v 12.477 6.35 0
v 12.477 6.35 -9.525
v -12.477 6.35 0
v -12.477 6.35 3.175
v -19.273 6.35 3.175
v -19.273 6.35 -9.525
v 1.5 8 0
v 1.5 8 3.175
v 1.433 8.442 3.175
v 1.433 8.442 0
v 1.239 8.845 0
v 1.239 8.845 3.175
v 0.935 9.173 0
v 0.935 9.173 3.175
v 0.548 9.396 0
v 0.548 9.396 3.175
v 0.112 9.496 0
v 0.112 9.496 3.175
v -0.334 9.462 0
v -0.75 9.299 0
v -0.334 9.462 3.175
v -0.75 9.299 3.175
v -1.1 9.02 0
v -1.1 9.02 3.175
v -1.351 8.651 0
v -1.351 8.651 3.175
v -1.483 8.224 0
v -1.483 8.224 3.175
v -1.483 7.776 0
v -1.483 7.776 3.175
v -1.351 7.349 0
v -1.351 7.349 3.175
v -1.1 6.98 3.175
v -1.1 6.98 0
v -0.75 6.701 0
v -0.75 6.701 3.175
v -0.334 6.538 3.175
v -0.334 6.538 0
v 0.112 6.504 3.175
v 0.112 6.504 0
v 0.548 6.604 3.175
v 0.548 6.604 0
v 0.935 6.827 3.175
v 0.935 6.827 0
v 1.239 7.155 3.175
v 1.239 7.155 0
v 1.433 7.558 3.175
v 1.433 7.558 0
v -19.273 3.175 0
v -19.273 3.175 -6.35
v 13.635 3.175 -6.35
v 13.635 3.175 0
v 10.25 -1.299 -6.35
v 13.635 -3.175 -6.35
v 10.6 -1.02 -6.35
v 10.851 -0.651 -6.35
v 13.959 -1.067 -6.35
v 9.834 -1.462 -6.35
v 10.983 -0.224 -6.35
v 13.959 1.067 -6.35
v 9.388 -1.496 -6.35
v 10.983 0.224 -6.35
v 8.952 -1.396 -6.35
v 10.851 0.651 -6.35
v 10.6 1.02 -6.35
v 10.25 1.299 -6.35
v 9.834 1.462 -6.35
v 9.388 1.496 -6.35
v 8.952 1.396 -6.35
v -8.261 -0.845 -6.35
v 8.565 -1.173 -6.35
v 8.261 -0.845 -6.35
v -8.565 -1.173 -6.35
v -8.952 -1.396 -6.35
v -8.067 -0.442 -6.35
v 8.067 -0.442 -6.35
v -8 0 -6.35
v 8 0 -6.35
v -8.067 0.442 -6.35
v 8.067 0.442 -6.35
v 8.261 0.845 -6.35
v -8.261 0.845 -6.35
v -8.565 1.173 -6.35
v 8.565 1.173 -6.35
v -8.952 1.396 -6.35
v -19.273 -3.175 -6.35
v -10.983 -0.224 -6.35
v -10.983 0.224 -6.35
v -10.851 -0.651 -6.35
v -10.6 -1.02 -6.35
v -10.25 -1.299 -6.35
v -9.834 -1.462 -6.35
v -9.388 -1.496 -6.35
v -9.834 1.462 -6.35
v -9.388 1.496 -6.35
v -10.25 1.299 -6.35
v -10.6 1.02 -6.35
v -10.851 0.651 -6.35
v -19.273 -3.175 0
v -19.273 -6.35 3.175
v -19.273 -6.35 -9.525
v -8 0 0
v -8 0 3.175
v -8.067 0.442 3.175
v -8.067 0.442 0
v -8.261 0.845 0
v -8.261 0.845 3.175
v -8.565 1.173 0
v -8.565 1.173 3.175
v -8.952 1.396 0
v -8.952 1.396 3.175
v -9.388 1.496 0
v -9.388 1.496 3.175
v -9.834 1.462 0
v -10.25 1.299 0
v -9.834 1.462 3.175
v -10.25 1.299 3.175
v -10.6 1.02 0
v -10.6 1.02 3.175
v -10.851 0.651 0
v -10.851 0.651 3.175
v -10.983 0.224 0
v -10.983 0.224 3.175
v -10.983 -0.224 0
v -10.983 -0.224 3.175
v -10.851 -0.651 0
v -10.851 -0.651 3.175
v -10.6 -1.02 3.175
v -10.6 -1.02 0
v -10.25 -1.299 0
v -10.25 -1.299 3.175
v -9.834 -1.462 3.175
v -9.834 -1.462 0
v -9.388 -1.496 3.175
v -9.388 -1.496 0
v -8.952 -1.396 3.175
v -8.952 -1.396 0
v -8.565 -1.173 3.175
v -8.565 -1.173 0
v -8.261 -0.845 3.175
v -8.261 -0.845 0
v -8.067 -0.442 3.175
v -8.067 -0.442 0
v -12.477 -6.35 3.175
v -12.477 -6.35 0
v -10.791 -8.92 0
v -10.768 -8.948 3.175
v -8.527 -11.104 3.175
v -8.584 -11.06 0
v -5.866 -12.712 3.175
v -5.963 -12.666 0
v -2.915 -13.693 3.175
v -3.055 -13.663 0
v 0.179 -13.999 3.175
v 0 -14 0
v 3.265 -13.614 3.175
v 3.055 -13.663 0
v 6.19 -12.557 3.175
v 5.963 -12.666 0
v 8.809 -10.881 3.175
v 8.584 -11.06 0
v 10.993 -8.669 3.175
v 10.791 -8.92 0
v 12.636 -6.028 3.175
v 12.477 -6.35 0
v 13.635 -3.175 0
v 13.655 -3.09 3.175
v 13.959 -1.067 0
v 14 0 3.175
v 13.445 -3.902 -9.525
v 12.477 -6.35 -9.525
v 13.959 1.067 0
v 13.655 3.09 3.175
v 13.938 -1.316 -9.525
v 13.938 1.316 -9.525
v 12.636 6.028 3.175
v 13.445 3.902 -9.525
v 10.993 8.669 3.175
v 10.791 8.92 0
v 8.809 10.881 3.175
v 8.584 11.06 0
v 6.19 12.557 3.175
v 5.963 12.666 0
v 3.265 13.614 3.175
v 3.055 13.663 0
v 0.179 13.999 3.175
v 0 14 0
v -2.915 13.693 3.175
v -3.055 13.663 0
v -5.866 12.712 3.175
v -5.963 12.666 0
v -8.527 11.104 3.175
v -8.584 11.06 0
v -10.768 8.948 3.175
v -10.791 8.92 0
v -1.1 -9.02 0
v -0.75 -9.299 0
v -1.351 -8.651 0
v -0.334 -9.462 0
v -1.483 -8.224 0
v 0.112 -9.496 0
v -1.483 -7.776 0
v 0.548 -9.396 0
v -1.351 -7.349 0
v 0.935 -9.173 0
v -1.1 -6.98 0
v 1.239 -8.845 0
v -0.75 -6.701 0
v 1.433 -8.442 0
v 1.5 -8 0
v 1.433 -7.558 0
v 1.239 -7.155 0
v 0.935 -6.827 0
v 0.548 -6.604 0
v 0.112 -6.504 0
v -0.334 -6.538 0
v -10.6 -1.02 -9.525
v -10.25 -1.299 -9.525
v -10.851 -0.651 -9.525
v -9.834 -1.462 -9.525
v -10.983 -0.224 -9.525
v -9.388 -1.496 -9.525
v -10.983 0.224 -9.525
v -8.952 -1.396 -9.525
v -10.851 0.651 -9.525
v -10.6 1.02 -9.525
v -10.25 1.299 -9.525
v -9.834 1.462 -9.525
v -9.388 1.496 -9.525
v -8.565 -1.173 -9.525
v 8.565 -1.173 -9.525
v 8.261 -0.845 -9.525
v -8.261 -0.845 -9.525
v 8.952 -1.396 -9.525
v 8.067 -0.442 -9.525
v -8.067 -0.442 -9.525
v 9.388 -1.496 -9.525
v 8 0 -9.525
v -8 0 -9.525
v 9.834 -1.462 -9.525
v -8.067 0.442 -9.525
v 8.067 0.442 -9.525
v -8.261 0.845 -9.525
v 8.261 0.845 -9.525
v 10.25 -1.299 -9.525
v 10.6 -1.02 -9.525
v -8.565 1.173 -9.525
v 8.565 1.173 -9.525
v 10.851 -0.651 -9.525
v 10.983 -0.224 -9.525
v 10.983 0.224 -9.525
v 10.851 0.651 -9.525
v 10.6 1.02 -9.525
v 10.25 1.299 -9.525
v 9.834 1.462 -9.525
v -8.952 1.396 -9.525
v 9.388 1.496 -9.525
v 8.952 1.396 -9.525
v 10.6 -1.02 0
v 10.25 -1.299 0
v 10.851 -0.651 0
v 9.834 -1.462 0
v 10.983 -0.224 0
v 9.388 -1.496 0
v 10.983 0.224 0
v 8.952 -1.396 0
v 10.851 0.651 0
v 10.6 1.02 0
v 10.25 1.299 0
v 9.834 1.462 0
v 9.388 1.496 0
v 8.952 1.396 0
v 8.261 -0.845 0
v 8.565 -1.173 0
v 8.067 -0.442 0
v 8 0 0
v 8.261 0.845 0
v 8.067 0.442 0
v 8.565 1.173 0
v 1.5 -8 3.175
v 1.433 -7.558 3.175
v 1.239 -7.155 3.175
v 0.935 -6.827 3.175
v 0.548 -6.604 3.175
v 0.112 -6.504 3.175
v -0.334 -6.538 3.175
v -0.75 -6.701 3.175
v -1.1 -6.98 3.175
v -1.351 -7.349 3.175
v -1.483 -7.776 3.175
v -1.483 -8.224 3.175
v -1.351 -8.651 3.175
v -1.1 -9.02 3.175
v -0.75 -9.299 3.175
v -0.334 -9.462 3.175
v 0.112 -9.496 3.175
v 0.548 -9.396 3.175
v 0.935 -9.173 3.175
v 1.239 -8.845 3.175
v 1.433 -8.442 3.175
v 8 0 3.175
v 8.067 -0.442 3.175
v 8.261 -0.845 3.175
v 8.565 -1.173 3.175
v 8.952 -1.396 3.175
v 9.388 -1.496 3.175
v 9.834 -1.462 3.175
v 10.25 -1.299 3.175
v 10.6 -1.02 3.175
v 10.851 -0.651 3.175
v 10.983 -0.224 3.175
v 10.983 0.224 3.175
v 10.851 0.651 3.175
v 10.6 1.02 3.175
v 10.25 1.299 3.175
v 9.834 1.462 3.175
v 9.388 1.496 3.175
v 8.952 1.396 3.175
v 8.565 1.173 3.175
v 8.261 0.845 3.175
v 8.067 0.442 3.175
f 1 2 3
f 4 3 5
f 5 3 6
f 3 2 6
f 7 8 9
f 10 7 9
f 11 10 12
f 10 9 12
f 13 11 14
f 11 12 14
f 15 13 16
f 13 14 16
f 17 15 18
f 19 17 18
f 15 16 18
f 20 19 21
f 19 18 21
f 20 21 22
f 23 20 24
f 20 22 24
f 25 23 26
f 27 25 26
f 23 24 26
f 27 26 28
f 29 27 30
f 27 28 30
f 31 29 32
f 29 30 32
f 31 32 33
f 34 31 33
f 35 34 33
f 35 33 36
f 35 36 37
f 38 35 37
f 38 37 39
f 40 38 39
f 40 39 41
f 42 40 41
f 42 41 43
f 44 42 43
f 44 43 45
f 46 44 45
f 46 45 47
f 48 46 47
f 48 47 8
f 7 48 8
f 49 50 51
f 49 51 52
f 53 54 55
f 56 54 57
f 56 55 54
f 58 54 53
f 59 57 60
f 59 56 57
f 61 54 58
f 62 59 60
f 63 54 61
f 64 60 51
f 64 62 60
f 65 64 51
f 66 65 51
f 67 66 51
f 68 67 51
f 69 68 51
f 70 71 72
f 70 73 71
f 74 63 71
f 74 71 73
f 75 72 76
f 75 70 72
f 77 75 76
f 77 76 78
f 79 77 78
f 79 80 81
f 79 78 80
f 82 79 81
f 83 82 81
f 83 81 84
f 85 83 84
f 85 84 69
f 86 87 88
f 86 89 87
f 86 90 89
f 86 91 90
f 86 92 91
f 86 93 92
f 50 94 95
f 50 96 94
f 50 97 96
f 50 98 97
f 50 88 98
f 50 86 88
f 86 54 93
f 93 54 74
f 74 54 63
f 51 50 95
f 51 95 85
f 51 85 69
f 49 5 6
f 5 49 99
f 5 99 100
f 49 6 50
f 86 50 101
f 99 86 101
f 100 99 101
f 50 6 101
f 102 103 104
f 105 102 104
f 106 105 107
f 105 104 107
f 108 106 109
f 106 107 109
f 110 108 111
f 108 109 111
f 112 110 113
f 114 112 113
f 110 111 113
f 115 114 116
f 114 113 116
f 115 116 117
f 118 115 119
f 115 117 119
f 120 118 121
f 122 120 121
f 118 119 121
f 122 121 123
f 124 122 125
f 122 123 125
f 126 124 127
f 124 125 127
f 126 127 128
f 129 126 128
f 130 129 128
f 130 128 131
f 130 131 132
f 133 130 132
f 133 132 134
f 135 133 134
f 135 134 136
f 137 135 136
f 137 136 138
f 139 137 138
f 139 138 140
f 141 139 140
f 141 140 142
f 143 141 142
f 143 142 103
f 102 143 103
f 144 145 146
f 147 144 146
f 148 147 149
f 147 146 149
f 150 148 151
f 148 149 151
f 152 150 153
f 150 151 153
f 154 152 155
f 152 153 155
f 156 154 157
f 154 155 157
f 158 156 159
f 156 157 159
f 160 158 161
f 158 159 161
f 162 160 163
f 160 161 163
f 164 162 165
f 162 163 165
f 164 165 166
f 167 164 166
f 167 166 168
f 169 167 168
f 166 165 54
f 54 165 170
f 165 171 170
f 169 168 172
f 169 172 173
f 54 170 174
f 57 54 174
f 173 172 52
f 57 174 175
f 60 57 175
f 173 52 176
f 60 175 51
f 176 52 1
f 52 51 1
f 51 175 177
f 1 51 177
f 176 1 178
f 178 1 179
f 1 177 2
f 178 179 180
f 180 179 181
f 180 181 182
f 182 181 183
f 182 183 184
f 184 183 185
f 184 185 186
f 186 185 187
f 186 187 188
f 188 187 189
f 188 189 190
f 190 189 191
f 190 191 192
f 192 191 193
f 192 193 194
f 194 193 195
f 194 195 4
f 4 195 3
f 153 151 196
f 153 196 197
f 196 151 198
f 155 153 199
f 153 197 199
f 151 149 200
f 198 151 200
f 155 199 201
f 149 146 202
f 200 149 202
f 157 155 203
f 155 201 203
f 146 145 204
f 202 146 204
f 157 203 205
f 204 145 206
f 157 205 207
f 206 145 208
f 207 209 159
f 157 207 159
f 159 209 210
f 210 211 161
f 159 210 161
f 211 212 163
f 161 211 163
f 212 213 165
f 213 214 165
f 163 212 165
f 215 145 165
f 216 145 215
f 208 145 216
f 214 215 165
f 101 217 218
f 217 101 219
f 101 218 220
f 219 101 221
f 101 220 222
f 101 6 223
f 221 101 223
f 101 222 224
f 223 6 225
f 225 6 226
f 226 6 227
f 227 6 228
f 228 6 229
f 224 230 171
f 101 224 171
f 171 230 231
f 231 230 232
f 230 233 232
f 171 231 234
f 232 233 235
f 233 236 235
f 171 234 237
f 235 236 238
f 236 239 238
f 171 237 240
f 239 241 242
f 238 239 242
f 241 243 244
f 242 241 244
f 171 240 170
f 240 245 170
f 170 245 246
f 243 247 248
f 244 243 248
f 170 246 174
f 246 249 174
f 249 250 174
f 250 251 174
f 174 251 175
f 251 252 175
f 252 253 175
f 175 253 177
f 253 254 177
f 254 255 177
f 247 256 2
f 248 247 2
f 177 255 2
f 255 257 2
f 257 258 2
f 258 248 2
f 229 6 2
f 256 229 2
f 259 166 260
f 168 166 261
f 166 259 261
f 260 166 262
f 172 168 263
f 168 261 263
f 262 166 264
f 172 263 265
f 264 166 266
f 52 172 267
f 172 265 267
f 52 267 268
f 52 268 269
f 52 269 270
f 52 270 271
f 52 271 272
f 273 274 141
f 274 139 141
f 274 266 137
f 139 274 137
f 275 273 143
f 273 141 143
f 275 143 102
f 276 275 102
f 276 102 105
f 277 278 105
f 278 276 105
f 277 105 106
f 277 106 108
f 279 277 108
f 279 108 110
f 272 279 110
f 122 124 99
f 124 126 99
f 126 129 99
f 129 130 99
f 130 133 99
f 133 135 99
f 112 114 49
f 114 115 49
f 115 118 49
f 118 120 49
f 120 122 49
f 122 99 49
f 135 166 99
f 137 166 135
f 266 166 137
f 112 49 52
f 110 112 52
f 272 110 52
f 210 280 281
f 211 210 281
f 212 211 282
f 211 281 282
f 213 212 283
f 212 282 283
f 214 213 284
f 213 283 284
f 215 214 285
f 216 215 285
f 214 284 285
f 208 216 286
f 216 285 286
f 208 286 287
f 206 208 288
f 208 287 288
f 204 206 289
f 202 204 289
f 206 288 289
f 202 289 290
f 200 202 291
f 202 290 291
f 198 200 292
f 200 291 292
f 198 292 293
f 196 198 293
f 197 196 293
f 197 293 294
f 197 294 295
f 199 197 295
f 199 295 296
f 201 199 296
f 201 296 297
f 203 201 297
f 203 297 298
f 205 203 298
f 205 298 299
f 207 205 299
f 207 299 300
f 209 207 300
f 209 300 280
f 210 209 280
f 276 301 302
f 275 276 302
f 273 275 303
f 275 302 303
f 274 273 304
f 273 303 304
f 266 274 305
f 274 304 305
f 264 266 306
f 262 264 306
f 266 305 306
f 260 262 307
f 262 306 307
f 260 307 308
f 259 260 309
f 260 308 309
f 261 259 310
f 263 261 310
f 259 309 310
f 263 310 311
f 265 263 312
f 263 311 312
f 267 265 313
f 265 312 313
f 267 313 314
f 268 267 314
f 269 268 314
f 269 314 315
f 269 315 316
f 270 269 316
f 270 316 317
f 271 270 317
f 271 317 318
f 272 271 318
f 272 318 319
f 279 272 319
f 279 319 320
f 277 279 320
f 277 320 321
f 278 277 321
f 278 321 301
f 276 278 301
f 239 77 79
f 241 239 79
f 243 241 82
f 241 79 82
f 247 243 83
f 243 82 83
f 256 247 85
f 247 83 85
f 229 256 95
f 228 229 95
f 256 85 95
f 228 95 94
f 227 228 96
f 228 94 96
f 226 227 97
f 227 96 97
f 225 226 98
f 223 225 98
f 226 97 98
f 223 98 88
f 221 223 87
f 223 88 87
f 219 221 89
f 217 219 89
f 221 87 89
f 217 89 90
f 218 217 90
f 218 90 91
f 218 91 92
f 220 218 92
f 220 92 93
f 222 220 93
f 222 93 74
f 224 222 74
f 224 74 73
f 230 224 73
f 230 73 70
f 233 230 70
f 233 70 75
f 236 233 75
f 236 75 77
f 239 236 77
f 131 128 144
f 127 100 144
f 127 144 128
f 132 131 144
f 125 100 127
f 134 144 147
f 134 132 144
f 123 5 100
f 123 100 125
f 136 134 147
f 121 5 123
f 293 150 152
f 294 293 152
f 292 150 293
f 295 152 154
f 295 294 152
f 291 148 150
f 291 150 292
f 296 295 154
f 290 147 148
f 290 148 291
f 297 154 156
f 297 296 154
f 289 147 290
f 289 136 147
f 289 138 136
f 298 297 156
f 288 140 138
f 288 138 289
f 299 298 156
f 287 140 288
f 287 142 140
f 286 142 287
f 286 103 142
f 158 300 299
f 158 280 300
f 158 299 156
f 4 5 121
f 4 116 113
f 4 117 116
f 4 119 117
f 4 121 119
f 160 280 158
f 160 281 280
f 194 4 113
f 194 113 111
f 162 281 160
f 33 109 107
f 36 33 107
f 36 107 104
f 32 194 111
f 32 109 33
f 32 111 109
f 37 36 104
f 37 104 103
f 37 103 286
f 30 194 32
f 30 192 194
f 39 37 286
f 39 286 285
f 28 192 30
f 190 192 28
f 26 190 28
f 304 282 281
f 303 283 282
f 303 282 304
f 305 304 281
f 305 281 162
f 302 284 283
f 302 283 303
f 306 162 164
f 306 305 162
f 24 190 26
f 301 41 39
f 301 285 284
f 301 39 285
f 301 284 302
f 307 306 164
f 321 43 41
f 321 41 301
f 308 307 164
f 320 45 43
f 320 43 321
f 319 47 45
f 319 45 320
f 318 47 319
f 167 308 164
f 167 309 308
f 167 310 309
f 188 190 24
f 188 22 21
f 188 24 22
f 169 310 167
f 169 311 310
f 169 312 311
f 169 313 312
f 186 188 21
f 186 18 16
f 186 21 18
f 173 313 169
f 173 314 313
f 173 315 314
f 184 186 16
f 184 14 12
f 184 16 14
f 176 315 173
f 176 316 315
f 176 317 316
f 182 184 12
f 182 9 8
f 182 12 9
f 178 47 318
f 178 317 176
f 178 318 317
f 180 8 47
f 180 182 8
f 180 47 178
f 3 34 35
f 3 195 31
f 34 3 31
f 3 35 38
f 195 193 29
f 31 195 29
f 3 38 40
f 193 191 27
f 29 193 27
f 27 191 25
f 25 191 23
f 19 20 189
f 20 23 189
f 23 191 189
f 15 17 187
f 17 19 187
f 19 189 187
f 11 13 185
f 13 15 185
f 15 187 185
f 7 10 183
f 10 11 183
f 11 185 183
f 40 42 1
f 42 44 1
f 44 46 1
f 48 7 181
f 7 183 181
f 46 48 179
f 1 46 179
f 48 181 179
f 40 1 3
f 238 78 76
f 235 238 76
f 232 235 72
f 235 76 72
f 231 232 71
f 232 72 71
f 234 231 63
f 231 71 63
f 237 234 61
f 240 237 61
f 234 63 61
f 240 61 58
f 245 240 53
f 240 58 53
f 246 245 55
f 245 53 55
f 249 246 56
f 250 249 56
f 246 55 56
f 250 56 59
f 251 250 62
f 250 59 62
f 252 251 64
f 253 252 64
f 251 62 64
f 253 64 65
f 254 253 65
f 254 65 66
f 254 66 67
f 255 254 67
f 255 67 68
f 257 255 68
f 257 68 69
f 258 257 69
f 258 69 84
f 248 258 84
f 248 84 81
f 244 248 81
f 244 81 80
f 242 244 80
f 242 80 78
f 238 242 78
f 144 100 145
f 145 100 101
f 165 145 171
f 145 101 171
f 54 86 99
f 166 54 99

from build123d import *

# Parameters (mm, degrees)
SKETCH1_R           = 14
BOSS_EXTRUDE1_DEPTH = 3.175
BOSS_EXTRUDE2_START = 12.7
BOSS_EXTRUDE2_DEPTH = 12.7
SKETCH3_W           = 6.35
SKETCH3_H           = 6.35
CUT_EXTRUDE1_DEPTH  = 38.333803689
SKETCH4_R           = 1.5
CUT_EXTRUDE2_DEPTH  = 27.995101119


with BuildPart() as part:
    # Sketch1 → Boss-Extrude1 (new body)
    with BuildSketch(Plane.XY):
        Circle(SKETCH1_R)
    extrude(amount=BOSS_EXTRUDE1_DEPTH)

    # Sketch2 → Boss-Extrude2 (add)
    with BuildSketch(Plane(origin=(0, 0, 3.175), x_dir=(-1, 0, 0), z_dir=(0, 0, -1)).offset(BOSS_EXTRUDE2_START)):
        with BuildLine():
            Line((-12.477078985, 6.35), (19.272921015, 6.35))
            Line((19.272921015, 6.35), (19.272921015, -6.35))
            Line((19.272921015, -6.35), (-12.477078985, -6.35))
            ThreePointArc((-12.477078985, -6.35), (-14, 0), (-12.477078985, 6.35))
        make_face()
    extrude(amount=-BOSS_EXTRUDE2_DEPTH)

    # Sketch3 → Cut-Extrude1 (cut, through all)
    with BuildSketch(Plane.ZY.offset(19.272921015)):
        with Locations((-3.175, 0)):
            Rectangle(SKETCH3_W, SKETCH3_H)
    extrude(amount=-CUT_EXTRUDE1_DEPTH, mode=Mode.SUBTRACT)

    # Sketch4 → Cut-Extrude2 (cut, through all)
    with BuildSketch(Plane.XY.offset(3.175)):
        with Locations((-9.5, 0)):
            Circle(SKETCH4_R)
        with Locations(Location((9.5, 0, 0), (0, 0, 180))):
            Circle(SKETCH4_R)
        with Locations((0, 8)):
            Circle(SKETCH4_R)
        with Locations((0, -8)):
            Circle(SKETCH4_R)
    extrude(amount=-CUT_EXTRUDE2_DEPTH, mode=Mode.SUBTRACT)


solid = part.part
